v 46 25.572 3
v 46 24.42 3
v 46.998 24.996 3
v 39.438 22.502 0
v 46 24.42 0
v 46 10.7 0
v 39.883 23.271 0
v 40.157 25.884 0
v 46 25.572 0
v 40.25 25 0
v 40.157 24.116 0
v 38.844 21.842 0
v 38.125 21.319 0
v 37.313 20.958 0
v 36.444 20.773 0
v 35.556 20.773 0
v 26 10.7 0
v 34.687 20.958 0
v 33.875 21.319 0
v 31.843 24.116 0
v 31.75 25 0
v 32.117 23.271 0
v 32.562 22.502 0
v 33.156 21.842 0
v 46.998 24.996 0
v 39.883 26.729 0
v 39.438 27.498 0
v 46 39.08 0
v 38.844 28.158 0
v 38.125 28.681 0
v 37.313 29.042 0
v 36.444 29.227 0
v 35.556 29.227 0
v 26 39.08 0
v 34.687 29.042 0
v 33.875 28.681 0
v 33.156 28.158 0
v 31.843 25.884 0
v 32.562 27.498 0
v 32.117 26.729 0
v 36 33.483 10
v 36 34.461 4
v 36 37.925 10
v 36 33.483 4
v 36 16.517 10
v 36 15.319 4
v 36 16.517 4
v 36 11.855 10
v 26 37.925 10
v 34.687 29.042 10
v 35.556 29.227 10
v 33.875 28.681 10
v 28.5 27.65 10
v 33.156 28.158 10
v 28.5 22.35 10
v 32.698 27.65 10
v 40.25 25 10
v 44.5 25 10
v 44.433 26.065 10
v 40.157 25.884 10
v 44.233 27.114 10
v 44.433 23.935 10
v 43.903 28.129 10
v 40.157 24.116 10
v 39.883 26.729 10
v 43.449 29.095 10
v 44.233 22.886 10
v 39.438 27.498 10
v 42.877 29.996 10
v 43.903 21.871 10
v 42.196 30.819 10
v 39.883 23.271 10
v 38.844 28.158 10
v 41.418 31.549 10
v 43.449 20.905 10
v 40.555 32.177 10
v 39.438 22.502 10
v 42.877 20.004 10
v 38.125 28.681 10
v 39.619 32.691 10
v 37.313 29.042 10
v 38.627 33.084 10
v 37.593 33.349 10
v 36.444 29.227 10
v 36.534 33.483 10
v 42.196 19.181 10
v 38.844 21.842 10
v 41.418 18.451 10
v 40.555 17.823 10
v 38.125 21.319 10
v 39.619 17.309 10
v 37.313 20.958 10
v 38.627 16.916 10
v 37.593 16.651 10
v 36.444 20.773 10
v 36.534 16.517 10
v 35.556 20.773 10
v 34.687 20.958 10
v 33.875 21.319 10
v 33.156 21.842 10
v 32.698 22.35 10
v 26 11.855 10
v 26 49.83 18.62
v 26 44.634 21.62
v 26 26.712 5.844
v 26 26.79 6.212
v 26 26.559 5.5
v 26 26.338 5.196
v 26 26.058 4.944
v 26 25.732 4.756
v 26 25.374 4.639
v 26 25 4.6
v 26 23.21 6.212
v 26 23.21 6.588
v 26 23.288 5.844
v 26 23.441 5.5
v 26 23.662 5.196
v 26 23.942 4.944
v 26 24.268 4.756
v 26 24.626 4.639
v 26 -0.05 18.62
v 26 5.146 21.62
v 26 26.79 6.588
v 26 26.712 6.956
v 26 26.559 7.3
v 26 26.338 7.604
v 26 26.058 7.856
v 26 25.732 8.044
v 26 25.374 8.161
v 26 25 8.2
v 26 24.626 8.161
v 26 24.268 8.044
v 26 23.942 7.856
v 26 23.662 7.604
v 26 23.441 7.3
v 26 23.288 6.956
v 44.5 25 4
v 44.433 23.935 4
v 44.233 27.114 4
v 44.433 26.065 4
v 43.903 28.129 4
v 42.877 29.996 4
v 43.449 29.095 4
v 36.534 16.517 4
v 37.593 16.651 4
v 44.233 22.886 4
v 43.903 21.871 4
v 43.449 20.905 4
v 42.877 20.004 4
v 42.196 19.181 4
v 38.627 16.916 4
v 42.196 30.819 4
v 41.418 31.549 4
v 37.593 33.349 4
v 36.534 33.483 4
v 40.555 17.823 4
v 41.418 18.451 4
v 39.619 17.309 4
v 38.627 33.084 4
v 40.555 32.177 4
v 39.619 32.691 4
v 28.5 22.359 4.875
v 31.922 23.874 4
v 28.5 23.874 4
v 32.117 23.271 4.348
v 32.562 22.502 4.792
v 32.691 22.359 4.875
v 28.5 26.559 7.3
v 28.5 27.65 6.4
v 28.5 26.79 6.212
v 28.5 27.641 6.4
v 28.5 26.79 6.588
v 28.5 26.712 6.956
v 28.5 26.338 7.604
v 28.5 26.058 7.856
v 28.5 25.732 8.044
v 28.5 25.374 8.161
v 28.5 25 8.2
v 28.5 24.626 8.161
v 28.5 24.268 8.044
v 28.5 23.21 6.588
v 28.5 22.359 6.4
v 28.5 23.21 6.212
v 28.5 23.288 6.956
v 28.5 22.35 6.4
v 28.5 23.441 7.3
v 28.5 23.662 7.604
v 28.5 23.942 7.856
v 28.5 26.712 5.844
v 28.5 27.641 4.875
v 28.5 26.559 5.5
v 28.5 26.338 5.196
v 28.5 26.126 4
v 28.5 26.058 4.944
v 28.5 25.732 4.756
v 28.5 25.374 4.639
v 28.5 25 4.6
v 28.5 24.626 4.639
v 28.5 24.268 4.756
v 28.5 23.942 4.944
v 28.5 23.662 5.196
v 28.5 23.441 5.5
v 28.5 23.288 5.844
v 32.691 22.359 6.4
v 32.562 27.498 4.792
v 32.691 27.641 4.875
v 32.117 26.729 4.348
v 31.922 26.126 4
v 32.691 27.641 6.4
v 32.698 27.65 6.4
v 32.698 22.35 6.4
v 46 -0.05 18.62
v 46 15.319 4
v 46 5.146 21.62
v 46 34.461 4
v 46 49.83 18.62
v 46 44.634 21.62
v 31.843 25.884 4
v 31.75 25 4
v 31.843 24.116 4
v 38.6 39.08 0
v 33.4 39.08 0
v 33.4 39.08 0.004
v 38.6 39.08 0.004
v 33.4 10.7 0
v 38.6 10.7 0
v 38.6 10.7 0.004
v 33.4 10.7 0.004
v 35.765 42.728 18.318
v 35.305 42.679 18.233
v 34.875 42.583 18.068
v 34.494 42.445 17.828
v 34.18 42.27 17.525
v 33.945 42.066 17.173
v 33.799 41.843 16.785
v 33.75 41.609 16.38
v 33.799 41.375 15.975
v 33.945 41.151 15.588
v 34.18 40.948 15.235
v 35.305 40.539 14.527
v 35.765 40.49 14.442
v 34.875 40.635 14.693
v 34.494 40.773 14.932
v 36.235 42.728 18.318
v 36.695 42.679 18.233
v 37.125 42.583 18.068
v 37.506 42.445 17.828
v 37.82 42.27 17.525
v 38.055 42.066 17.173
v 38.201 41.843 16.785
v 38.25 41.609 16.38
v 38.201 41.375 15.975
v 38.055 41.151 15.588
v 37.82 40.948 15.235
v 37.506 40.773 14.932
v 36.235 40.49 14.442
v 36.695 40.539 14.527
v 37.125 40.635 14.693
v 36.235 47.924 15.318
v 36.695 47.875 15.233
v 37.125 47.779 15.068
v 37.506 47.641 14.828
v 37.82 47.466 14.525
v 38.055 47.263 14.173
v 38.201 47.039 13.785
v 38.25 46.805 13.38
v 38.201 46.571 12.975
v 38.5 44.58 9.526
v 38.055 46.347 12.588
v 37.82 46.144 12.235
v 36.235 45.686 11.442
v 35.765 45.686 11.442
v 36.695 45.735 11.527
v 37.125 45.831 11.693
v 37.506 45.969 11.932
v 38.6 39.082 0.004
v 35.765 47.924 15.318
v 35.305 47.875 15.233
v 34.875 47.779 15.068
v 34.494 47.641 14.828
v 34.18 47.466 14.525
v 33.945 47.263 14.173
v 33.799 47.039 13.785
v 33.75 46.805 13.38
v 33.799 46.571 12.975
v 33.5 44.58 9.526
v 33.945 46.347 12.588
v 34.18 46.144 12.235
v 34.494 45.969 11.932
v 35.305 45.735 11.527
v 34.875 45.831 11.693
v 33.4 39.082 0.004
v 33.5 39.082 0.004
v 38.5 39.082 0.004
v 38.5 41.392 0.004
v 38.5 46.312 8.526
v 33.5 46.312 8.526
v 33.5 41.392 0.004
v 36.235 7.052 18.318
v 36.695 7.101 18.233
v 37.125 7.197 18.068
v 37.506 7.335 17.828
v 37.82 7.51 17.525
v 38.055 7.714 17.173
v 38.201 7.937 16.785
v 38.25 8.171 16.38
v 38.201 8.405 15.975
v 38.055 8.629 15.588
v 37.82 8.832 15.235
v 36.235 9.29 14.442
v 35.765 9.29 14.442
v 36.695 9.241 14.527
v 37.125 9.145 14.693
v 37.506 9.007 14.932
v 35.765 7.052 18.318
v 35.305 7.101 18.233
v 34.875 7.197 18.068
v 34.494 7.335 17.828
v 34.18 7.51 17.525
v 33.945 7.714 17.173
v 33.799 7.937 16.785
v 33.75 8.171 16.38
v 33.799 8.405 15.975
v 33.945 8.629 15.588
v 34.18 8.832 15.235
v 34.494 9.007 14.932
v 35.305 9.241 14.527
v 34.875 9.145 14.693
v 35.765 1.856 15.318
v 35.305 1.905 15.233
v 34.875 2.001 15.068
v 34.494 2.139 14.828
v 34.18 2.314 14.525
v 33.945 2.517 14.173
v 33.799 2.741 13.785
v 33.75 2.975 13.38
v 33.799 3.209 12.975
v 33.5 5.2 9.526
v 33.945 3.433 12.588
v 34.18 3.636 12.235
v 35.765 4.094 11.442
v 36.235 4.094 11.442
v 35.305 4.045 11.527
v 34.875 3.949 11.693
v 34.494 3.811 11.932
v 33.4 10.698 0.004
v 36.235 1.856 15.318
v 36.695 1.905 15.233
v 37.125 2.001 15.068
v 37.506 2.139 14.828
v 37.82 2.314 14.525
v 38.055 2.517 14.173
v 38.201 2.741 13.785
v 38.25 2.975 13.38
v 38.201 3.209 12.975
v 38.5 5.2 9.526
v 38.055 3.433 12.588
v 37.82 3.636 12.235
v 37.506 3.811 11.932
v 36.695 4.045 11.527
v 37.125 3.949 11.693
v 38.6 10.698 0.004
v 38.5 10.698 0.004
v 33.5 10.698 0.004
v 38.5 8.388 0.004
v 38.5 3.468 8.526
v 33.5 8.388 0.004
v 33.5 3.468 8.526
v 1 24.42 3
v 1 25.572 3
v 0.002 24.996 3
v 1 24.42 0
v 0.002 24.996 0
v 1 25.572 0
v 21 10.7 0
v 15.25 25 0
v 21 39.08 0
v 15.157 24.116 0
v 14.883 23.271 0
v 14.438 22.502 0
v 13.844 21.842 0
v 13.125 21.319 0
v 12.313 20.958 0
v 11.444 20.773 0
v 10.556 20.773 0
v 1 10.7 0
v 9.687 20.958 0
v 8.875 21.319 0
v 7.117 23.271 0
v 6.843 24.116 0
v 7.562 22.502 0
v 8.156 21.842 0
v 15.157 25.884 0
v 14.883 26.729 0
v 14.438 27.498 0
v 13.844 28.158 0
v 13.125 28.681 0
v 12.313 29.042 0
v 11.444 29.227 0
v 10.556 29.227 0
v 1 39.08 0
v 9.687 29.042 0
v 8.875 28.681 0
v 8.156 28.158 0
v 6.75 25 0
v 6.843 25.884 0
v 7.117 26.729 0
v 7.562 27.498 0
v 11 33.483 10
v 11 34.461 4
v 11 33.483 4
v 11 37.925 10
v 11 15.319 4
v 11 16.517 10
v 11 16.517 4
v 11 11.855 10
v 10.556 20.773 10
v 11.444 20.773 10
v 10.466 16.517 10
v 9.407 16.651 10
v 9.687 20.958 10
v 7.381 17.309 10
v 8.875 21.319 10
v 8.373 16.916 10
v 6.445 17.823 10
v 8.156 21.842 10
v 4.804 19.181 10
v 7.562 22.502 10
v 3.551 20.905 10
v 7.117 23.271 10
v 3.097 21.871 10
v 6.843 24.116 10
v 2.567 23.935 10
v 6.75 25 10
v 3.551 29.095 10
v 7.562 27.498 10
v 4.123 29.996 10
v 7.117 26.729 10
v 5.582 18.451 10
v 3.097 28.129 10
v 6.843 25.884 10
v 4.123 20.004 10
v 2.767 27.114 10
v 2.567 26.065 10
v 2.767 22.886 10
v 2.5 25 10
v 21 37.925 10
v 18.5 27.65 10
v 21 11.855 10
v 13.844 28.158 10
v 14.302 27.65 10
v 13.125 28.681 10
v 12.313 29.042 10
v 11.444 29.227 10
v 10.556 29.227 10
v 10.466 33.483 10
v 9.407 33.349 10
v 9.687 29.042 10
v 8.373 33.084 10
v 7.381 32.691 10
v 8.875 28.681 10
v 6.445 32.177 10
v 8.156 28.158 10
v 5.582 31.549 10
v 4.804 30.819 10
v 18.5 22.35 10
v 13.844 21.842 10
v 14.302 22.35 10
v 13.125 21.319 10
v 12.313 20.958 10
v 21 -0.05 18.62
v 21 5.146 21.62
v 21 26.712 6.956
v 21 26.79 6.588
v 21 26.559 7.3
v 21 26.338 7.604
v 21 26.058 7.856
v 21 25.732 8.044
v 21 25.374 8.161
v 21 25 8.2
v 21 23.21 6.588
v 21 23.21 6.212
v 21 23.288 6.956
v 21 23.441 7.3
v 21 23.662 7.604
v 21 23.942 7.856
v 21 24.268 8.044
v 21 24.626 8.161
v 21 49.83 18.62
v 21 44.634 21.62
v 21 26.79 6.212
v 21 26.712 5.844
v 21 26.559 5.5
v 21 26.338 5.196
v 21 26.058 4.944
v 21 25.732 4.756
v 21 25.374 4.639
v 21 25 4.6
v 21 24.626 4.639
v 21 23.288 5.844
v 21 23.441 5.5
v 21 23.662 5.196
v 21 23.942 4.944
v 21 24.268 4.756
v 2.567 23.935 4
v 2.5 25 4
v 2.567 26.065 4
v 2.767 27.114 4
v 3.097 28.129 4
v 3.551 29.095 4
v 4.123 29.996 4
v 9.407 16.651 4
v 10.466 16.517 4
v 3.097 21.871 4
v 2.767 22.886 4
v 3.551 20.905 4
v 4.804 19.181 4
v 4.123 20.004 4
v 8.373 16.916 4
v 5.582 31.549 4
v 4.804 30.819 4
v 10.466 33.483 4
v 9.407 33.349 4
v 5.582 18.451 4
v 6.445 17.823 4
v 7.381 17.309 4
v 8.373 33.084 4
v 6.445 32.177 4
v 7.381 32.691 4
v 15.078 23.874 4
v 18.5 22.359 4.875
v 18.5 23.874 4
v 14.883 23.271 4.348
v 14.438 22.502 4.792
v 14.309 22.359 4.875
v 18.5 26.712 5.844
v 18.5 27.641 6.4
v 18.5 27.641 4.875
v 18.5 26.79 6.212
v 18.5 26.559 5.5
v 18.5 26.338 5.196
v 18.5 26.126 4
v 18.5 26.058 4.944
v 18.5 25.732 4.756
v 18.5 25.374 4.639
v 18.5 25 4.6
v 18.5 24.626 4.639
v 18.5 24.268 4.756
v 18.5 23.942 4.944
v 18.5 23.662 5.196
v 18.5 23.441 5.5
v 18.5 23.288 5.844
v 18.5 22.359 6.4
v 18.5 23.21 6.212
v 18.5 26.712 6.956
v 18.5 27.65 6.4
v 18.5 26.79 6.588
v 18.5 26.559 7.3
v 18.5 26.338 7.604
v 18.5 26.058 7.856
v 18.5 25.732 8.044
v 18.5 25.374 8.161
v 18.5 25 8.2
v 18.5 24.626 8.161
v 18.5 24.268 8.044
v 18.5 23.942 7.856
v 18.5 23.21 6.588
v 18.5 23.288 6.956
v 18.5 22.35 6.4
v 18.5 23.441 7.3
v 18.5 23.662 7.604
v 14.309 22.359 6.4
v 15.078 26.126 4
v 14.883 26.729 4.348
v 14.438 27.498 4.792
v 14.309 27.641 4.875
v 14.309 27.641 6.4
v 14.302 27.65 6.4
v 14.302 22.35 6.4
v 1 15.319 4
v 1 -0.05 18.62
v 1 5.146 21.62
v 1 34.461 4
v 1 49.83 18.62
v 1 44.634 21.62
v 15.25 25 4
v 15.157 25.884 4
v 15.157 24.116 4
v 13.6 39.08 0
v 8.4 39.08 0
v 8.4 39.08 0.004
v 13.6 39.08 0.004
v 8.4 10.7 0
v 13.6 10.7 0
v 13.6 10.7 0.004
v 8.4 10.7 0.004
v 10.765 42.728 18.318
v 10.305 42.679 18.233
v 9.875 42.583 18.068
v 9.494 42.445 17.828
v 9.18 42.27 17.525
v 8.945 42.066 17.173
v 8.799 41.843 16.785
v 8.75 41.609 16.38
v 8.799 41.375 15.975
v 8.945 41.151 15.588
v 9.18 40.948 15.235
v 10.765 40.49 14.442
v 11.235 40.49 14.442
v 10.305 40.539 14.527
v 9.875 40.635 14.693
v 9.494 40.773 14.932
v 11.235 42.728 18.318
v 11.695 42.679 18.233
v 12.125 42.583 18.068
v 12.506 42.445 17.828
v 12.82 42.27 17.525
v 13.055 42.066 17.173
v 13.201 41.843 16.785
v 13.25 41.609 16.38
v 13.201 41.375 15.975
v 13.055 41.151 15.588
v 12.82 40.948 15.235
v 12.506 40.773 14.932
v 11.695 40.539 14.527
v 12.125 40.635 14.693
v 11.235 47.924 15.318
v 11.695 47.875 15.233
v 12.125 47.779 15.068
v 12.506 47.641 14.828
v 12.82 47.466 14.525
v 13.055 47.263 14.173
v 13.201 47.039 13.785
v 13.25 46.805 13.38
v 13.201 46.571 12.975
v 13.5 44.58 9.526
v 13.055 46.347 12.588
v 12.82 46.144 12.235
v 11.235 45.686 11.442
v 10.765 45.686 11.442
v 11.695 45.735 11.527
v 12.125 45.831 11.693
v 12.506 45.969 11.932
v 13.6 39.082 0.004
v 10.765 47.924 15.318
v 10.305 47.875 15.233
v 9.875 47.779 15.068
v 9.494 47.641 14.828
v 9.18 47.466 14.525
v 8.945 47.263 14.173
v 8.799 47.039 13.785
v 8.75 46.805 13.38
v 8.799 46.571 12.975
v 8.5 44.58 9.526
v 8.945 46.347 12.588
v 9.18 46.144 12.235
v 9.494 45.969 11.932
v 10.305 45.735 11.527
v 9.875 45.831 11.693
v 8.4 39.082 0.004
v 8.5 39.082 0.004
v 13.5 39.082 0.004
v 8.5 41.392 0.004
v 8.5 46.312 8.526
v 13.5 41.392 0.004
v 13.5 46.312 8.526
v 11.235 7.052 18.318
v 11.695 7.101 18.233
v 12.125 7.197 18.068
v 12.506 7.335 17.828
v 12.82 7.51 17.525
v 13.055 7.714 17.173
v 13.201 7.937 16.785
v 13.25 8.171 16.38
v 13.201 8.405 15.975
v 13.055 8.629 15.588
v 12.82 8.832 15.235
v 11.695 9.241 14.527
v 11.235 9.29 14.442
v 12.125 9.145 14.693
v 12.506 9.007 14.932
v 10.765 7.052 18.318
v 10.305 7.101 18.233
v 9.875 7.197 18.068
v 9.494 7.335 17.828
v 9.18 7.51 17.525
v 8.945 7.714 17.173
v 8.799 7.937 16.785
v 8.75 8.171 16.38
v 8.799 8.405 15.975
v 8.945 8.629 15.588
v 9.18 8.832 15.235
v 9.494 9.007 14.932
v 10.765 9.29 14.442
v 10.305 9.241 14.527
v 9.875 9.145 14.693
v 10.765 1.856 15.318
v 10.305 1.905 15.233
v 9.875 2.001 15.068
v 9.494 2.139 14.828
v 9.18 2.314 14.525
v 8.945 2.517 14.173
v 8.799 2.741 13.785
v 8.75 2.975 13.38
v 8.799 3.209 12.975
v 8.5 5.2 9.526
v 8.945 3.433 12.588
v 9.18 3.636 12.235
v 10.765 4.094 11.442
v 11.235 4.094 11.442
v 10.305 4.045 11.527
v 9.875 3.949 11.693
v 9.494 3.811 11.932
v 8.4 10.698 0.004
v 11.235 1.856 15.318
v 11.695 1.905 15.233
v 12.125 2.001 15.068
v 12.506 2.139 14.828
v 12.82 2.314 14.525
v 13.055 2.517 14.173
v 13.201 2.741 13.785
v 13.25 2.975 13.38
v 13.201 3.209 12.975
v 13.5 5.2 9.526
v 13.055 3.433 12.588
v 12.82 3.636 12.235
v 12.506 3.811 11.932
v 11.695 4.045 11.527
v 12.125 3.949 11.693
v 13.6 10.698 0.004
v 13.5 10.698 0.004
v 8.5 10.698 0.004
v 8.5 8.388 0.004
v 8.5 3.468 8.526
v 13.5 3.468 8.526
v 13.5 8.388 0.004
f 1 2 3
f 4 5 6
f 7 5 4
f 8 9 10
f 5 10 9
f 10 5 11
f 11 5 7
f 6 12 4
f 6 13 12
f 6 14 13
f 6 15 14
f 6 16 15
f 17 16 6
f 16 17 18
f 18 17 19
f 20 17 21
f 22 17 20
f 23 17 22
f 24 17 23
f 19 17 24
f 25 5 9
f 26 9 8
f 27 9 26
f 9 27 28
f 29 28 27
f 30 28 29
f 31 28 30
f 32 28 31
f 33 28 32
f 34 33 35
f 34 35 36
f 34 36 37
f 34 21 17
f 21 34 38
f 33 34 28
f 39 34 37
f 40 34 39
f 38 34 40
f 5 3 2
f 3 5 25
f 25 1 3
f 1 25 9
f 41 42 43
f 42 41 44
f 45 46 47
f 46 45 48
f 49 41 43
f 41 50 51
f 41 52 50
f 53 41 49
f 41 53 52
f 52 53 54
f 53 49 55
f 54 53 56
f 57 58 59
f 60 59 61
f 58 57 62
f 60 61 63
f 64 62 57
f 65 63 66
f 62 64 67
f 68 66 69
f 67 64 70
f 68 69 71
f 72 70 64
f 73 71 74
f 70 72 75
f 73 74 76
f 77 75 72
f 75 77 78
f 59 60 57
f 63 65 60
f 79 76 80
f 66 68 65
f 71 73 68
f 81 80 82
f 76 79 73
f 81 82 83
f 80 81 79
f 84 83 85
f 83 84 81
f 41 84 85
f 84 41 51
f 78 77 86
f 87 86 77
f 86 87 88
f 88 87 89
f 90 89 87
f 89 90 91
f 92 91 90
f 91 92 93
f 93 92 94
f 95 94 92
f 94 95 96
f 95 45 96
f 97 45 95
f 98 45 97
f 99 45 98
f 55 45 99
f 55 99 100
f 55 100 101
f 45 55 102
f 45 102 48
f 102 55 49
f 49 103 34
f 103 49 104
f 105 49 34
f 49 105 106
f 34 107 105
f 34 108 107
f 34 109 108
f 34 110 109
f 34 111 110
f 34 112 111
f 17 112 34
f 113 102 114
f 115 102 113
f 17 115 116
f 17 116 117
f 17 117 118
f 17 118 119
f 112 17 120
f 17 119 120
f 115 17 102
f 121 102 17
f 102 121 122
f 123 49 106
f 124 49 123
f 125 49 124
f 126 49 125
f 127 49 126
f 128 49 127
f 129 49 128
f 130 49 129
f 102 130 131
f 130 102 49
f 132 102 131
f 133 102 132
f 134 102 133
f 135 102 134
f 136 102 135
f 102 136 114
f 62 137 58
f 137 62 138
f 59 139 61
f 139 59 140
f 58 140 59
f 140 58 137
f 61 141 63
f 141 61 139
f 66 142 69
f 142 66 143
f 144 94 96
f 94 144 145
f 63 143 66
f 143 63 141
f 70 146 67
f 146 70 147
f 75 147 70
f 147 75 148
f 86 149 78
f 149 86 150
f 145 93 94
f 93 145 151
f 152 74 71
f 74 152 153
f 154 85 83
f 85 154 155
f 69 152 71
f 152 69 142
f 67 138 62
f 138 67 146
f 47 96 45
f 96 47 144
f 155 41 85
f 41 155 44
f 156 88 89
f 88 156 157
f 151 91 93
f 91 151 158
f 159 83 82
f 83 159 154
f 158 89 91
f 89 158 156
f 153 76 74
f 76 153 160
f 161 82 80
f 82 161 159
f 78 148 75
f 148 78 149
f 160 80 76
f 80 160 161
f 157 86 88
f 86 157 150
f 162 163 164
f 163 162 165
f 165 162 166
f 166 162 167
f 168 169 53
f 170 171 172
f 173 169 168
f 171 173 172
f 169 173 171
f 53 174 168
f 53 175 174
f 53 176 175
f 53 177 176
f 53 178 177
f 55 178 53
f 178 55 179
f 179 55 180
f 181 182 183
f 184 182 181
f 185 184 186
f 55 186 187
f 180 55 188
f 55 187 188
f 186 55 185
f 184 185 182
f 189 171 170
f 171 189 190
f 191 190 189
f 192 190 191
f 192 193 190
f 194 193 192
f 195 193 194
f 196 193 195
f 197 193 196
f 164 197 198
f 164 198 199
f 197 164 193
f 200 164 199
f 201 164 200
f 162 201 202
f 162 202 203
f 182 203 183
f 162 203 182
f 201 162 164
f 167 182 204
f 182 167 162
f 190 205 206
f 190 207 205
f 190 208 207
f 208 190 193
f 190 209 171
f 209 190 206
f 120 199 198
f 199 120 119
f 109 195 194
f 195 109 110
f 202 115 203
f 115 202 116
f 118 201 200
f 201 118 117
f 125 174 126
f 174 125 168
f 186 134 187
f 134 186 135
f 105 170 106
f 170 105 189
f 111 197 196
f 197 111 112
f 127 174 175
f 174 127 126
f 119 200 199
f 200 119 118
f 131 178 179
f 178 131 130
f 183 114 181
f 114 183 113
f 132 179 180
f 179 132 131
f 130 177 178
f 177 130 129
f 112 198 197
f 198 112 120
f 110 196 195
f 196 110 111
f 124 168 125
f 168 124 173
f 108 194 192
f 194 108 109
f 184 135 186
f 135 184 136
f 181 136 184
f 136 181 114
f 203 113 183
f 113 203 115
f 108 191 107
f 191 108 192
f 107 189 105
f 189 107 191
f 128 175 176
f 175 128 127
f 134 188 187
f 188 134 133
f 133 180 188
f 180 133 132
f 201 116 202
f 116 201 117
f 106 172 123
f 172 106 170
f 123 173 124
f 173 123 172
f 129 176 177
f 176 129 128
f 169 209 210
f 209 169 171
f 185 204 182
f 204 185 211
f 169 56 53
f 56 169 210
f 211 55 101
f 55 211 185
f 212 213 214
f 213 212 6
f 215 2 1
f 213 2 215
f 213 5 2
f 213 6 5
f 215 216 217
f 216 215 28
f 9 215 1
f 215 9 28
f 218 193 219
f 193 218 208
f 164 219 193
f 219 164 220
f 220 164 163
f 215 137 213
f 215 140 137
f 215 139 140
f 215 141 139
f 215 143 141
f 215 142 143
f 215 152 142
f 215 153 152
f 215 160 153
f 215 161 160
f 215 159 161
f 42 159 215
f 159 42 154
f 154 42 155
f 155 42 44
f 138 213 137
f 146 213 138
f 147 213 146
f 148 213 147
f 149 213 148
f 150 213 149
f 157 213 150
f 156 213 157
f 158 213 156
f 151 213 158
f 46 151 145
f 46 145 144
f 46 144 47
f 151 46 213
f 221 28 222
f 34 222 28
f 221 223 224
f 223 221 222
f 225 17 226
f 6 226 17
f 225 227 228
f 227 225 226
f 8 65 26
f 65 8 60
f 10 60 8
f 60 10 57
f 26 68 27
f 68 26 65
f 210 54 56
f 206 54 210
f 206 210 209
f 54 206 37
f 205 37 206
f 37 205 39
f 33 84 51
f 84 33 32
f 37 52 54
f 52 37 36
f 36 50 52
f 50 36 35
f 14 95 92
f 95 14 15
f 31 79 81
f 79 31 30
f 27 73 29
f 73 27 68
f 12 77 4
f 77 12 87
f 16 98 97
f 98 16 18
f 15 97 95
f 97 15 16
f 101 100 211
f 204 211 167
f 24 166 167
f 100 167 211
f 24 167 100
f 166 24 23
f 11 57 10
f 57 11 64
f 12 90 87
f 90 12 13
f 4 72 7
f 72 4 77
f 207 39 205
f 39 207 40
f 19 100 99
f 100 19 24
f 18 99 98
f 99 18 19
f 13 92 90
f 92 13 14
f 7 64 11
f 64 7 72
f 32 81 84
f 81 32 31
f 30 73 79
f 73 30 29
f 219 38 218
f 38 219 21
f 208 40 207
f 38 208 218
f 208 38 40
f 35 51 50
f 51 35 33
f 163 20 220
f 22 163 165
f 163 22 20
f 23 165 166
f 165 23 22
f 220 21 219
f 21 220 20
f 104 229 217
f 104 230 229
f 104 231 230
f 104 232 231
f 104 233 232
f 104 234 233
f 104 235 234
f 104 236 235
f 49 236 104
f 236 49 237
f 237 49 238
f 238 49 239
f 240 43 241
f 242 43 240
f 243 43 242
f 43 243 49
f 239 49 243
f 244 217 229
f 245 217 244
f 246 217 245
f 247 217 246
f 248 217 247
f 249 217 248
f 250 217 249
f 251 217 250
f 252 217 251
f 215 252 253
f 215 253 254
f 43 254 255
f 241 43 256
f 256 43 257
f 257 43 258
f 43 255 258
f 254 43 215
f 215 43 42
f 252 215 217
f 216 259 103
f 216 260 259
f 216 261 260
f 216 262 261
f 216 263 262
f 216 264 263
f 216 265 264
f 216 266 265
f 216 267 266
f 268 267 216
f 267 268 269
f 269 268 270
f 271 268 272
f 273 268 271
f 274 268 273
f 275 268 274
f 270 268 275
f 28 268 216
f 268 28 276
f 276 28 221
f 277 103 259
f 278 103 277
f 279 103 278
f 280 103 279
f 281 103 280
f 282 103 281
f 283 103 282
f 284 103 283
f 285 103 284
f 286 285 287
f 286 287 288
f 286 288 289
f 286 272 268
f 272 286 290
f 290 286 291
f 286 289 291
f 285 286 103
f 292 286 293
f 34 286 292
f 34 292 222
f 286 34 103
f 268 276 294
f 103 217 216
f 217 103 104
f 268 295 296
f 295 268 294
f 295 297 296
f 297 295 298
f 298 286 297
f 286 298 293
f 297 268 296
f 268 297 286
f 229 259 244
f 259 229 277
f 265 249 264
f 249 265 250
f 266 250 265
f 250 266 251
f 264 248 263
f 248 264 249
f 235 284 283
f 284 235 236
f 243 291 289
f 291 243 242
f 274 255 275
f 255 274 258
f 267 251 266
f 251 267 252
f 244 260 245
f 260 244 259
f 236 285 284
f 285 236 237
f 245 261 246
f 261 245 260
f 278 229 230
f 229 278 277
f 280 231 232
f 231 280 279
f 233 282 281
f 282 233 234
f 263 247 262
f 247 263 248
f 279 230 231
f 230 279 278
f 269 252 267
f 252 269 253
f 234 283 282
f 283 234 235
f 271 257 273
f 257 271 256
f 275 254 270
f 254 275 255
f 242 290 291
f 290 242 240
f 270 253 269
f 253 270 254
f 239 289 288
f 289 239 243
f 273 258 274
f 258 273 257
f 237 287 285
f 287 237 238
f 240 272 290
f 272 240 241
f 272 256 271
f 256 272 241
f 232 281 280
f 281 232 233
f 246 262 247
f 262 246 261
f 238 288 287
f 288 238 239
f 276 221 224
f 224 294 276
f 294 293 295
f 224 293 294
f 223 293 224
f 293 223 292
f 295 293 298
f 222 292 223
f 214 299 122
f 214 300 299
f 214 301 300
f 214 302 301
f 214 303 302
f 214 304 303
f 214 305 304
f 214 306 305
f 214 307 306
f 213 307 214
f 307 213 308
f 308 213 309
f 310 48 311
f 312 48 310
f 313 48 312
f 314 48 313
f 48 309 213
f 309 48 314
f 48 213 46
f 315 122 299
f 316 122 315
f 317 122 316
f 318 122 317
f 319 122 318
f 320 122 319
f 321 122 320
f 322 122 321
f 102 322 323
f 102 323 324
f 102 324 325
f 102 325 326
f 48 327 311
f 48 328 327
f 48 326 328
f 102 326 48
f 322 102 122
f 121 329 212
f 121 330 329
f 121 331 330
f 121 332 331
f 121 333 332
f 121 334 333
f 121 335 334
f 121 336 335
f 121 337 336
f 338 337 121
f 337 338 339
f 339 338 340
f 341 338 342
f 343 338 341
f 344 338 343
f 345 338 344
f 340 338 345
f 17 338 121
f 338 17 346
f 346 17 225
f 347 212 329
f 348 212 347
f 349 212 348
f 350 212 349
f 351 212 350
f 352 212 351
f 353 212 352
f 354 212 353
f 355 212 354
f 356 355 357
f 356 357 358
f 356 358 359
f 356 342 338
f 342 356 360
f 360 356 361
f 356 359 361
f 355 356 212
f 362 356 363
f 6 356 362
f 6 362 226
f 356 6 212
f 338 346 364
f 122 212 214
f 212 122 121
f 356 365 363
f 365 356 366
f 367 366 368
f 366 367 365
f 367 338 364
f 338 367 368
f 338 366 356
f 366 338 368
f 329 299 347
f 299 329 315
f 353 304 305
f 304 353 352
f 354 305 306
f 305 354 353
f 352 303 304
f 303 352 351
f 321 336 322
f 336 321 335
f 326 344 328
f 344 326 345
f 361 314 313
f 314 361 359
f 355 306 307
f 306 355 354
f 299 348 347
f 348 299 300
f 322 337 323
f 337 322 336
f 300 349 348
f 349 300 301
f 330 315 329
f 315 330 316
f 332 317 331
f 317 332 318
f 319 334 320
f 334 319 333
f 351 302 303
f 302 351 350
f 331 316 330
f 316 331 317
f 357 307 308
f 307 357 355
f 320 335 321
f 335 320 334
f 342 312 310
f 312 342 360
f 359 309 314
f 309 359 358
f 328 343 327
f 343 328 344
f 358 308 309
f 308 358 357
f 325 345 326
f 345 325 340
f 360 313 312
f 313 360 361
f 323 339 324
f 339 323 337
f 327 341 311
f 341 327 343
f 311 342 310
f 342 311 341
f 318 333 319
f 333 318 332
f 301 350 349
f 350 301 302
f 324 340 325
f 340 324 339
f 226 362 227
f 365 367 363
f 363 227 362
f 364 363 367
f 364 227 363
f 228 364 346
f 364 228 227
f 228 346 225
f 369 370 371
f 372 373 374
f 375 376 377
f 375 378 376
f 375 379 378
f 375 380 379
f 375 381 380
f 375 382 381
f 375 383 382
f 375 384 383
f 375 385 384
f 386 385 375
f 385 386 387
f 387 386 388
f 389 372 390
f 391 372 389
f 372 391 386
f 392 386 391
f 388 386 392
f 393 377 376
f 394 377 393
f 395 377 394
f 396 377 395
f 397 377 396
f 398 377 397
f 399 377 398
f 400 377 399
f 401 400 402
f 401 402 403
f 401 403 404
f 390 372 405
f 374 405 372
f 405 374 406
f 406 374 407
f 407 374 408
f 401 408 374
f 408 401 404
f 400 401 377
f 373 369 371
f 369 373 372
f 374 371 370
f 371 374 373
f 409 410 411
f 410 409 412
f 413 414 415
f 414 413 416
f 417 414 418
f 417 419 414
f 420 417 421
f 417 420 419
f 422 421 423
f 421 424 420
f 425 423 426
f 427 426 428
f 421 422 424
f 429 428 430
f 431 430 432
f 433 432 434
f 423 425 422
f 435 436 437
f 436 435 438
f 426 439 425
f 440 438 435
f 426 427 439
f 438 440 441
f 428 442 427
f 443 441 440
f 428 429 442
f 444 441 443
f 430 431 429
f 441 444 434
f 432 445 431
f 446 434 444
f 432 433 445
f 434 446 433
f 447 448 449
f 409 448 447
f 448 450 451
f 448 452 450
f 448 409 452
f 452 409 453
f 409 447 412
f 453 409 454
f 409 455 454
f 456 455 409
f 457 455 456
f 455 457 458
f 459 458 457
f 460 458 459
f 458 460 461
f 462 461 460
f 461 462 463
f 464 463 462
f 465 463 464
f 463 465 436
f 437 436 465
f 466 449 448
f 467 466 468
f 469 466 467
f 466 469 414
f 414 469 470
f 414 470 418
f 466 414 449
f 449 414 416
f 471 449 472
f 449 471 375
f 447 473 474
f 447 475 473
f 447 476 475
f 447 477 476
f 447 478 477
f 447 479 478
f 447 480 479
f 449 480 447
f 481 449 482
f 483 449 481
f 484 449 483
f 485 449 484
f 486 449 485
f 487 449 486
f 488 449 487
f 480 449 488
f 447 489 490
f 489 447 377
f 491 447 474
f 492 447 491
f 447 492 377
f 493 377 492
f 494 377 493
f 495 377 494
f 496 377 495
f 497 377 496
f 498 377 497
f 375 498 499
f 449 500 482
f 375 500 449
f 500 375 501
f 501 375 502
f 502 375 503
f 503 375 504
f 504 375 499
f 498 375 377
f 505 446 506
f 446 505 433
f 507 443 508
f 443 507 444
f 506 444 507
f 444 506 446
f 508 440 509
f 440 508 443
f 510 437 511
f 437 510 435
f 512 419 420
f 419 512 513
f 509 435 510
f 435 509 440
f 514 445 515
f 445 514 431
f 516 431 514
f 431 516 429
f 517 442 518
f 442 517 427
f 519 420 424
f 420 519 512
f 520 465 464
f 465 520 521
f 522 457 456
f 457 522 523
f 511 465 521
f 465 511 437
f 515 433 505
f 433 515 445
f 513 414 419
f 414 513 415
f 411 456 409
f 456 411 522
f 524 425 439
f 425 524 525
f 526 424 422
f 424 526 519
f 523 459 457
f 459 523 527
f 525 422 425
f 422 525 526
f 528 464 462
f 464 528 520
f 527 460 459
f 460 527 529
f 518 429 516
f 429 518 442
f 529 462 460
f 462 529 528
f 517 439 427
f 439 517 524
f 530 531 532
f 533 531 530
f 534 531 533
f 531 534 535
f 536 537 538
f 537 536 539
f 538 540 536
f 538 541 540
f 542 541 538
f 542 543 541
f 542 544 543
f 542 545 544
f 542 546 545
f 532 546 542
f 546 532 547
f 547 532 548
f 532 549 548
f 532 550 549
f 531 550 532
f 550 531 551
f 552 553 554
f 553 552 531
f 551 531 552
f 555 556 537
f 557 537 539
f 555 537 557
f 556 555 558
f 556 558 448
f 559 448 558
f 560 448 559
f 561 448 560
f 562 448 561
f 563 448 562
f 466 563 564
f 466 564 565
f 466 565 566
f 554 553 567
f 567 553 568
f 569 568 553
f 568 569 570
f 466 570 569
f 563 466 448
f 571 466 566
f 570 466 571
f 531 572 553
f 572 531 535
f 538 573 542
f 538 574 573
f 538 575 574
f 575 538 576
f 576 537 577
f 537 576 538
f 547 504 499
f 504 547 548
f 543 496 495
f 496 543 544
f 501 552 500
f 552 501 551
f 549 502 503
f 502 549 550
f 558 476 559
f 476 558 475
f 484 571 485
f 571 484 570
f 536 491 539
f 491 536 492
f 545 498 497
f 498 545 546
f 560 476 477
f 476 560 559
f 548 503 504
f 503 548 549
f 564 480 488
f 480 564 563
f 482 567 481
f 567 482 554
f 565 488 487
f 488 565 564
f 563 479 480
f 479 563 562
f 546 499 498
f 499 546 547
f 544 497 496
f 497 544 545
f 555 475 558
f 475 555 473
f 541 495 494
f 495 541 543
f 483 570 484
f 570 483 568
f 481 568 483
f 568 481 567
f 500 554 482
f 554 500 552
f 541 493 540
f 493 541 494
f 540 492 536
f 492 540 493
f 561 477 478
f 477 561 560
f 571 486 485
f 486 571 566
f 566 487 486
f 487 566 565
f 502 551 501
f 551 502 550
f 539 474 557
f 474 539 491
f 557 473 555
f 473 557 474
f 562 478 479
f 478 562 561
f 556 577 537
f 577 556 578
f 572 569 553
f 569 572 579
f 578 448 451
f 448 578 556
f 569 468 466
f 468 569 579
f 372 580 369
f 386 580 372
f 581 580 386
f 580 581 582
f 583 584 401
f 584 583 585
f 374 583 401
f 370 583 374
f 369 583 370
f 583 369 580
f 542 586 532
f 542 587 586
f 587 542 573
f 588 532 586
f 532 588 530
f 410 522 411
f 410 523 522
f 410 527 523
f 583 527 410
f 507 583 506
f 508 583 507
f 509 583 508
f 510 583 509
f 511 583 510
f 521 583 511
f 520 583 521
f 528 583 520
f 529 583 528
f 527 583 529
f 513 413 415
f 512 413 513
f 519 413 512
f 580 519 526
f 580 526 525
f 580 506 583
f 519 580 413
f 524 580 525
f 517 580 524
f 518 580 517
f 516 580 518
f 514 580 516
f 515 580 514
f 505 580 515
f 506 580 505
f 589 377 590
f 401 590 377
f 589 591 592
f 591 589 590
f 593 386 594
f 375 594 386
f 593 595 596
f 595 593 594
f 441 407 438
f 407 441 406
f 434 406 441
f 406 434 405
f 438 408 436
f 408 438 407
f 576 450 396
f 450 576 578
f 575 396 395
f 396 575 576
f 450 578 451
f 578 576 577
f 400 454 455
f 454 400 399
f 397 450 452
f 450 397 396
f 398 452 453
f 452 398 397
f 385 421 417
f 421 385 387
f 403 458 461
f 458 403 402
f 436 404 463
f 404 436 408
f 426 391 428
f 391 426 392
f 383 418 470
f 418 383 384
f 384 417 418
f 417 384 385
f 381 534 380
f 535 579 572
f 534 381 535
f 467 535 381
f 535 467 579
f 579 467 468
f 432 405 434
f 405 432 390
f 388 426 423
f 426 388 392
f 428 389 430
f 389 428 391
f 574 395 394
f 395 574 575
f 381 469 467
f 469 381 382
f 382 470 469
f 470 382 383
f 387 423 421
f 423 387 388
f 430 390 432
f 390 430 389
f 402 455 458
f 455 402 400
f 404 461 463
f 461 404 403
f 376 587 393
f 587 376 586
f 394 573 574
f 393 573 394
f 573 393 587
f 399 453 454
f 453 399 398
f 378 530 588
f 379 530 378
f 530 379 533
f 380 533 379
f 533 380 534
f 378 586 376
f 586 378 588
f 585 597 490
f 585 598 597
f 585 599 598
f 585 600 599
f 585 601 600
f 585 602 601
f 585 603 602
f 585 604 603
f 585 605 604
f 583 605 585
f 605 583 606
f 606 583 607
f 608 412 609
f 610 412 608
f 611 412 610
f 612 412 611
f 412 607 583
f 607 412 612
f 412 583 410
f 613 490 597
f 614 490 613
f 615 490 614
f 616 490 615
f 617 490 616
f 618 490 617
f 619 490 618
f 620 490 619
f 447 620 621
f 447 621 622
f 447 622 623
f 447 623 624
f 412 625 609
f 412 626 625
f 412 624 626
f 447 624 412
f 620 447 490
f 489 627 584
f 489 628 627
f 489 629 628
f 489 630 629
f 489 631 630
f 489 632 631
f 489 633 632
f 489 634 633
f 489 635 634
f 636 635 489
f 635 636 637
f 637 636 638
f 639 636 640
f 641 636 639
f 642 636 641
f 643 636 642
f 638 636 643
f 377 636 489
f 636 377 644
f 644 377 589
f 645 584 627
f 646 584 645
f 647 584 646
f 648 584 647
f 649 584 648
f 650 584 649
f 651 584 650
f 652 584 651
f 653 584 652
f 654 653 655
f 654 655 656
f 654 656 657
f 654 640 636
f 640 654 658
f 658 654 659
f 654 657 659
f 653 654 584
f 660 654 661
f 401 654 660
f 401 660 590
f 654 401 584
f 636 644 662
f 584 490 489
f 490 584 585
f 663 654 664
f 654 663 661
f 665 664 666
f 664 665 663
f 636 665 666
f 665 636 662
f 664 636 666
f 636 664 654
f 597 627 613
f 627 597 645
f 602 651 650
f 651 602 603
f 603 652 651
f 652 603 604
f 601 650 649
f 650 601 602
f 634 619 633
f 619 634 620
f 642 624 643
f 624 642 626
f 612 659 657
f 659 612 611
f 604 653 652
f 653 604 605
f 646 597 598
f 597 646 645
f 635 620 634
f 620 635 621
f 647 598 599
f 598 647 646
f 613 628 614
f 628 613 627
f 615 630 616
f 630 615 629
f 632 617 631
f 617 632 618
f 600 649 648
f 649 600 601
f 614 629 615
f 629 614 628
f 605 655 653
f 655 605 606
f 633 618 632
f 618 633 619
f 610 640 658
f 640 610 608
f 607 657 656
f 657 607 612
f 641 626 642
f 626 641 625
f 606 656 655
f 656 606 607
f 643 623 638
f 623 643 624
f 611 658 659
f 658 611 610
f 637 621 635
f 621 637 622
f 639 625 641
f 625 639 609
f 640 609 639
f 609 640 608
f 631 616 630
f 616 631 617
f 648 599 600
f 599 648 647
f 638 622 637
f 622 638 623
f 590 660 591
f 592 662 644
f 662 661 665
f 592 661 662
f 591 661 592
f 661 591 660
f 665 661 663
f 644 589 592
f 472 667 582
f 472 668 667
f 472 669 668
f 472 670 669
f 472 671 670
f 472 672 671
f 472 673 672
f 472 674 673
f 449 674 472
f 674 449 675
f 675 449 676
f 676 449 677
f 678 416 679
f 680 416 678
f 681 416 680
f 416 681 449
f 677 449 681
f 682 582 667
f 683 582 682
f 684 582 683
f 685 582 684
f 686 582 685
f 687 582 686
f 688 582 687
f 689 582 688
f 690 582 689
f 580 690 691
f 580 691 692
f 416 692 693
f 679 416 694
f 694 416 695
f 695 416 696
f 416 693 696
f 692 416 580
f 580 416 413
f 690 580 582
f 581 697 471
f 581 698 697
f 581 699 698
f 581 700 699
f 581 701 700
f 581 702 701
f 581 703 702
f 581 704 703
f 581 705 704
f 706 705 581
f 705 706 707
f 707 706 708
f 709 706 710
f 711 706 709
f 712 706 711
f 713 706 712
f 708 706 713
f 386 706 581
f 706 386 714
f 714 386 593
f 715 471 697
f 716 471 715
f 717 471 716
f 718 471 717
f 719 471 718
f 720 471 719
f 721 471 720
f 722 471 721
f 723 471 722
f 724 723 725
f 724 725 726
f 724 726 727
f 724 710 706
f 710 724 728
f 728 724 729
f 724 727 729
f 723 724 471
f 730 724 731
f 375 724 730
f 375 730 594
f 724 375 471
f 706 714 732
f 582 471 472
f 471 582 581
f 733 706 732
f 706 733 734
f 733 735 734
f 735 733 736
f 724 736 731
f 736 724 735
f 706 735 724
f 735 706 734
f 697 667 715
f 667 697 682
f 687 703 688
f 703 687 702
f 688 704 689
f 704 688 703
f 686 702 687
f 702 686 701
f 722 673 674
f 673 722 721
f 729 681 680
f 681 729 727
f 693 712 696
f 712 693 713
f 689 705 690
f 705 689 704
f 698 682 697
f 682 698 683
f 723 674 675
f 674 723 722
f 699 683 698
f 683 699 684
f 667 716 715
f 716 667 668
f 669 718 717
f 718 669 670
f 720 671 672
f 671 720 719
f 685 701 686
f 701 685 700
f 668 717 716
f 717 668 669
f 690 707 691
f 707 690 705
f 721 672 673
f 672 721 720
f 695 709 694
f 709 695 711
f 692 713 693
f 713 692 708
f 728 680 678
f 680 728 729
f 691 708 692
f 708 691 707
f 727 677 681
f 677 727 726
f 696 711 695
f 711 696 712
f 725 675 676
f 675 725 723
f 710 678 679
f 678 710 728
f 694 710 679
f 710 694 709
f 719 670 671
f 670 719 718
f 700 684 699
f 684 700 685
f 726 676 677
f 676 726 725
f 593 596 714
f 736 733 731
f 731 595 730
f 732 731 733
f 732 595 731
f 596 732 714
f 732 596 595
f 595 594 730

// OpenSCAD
// file: metric.scad
// PRUSA Mendel  
// Default metric sizes
// GNU GPL v3
// Josef Průša
// josefprusa@me.com
// prusadjs.cz
// http://www.reprap.org/wiki/Prusa_Mendel
// http://github.com/prusajr/PrusaMendel

// DONT CHANGE THIS FILE! ALTER VALUES IN CONFIGURATION.SCAD INSTEAD

// RODS

threaded_rod_diameter = 8.7;
threaded_rod_diameter_horizontal = 8.7;
smooth_bar_diameter = 8;
smooth_bar_diameter_horizontal = 8.5;

// Nuts and bolts

m8_diameter = 9;
m8_nut_diameter = 14.1;

m4_diameter = 4.5;
m4_nut_diameter = 8.5;

m3_diameter = 3.6;
m3_nut_diameter = 5.3;
m3_nut_diameter_horizontal = 6.1;

// Bushing holder

bushing_core_diameter = smooth_bar_diameter;
bushing_material_thickness = 1;

// Motors

motor_shaft = 5.5;
// main file
// C. Strang		
// cstrang@????
// funfor.us

h = 4;       	// base thickness
m = h-1;	// marker height
o = 0.1;	//  overlap amount
hh = 6;	// bar holder height

//import("Rod Holder - Ztop.stl");

include <metric.scad>;

m3=m3_diameter;
m3n=m3_nut_diameter_horizontal;
m4=m4_diameter ; 
m8=smooth_bar_diameter_horizontal;

$fn=30;

translate([26,0,0]) ztopholder();
translate([21,0,0]) mirror() ztopholder();

module ztopholder()
{
	difference()
	{
		union()
		{
			translate([0,10.7,0]) rotate([0,0,0]) cube([20,28.38,h]);
			translate([20-0.1,24.4,0]) marker();
			translate([0,16.5,h-o]) rodholder();
		}
		translate([10,25,-o]) cylinder(r=m8/2,h=h+hh+4);

	}
	translate([0,39.08,0]) rotate([60,0,0]) slantbase();
	translate([0,10.7,0]) mirror([0,1,0]) rotate([60,0,0]) slantbase();
}

module marker()
{
	difference()
	{
		cube([1.1,1.2,m]);
		translate([1,-1.77,-o]) rotate([0,0,30]) cube([2,2,m+2*o]);
		translate([0,1.23,-o]) rotate([0,0,-30]) cube([2,2,m+2*o]);
	}
}

module rodholder()
{
	difference()
	{
		union()
		{
			translate([0,-5,0]) rotate([0,0,0]) cube([10,27,hh+o]);
			translate([10,8.5,0]) cylinder(r=(m8),h=hh+o,$fn=50);
		}
		translate([2.5,8.5,2.5]) rotate([90,90,90]) cylinder(r=m3n/2,h=5,$fn=6);
		translate([-0.1,8.5,2.5]) rotate([90,90,90]) cylinder(r=m3/2,h=9);
		translate([2.5,5.85,2.5]) rotate([0,0,0]) cube([5,m3n-0.8,m3n]);

	}
}

module slantbase()
{
	difference()
	{
		union()
		{
			translate([0,0,0]) rotate([0,0,0]) cube([20,21.5,hh]);
			translate([7.5,0,-2]) cube([5,11,2.1]);
		}
		translate([10,15.45,-o]) rotate([0,0,0]) cylinder(r=m4/2,h=9);
		translate([7.4,-2.42,0]) rotate([-60,0,0]) cube([5.2,11,2.1]);
	}

}
